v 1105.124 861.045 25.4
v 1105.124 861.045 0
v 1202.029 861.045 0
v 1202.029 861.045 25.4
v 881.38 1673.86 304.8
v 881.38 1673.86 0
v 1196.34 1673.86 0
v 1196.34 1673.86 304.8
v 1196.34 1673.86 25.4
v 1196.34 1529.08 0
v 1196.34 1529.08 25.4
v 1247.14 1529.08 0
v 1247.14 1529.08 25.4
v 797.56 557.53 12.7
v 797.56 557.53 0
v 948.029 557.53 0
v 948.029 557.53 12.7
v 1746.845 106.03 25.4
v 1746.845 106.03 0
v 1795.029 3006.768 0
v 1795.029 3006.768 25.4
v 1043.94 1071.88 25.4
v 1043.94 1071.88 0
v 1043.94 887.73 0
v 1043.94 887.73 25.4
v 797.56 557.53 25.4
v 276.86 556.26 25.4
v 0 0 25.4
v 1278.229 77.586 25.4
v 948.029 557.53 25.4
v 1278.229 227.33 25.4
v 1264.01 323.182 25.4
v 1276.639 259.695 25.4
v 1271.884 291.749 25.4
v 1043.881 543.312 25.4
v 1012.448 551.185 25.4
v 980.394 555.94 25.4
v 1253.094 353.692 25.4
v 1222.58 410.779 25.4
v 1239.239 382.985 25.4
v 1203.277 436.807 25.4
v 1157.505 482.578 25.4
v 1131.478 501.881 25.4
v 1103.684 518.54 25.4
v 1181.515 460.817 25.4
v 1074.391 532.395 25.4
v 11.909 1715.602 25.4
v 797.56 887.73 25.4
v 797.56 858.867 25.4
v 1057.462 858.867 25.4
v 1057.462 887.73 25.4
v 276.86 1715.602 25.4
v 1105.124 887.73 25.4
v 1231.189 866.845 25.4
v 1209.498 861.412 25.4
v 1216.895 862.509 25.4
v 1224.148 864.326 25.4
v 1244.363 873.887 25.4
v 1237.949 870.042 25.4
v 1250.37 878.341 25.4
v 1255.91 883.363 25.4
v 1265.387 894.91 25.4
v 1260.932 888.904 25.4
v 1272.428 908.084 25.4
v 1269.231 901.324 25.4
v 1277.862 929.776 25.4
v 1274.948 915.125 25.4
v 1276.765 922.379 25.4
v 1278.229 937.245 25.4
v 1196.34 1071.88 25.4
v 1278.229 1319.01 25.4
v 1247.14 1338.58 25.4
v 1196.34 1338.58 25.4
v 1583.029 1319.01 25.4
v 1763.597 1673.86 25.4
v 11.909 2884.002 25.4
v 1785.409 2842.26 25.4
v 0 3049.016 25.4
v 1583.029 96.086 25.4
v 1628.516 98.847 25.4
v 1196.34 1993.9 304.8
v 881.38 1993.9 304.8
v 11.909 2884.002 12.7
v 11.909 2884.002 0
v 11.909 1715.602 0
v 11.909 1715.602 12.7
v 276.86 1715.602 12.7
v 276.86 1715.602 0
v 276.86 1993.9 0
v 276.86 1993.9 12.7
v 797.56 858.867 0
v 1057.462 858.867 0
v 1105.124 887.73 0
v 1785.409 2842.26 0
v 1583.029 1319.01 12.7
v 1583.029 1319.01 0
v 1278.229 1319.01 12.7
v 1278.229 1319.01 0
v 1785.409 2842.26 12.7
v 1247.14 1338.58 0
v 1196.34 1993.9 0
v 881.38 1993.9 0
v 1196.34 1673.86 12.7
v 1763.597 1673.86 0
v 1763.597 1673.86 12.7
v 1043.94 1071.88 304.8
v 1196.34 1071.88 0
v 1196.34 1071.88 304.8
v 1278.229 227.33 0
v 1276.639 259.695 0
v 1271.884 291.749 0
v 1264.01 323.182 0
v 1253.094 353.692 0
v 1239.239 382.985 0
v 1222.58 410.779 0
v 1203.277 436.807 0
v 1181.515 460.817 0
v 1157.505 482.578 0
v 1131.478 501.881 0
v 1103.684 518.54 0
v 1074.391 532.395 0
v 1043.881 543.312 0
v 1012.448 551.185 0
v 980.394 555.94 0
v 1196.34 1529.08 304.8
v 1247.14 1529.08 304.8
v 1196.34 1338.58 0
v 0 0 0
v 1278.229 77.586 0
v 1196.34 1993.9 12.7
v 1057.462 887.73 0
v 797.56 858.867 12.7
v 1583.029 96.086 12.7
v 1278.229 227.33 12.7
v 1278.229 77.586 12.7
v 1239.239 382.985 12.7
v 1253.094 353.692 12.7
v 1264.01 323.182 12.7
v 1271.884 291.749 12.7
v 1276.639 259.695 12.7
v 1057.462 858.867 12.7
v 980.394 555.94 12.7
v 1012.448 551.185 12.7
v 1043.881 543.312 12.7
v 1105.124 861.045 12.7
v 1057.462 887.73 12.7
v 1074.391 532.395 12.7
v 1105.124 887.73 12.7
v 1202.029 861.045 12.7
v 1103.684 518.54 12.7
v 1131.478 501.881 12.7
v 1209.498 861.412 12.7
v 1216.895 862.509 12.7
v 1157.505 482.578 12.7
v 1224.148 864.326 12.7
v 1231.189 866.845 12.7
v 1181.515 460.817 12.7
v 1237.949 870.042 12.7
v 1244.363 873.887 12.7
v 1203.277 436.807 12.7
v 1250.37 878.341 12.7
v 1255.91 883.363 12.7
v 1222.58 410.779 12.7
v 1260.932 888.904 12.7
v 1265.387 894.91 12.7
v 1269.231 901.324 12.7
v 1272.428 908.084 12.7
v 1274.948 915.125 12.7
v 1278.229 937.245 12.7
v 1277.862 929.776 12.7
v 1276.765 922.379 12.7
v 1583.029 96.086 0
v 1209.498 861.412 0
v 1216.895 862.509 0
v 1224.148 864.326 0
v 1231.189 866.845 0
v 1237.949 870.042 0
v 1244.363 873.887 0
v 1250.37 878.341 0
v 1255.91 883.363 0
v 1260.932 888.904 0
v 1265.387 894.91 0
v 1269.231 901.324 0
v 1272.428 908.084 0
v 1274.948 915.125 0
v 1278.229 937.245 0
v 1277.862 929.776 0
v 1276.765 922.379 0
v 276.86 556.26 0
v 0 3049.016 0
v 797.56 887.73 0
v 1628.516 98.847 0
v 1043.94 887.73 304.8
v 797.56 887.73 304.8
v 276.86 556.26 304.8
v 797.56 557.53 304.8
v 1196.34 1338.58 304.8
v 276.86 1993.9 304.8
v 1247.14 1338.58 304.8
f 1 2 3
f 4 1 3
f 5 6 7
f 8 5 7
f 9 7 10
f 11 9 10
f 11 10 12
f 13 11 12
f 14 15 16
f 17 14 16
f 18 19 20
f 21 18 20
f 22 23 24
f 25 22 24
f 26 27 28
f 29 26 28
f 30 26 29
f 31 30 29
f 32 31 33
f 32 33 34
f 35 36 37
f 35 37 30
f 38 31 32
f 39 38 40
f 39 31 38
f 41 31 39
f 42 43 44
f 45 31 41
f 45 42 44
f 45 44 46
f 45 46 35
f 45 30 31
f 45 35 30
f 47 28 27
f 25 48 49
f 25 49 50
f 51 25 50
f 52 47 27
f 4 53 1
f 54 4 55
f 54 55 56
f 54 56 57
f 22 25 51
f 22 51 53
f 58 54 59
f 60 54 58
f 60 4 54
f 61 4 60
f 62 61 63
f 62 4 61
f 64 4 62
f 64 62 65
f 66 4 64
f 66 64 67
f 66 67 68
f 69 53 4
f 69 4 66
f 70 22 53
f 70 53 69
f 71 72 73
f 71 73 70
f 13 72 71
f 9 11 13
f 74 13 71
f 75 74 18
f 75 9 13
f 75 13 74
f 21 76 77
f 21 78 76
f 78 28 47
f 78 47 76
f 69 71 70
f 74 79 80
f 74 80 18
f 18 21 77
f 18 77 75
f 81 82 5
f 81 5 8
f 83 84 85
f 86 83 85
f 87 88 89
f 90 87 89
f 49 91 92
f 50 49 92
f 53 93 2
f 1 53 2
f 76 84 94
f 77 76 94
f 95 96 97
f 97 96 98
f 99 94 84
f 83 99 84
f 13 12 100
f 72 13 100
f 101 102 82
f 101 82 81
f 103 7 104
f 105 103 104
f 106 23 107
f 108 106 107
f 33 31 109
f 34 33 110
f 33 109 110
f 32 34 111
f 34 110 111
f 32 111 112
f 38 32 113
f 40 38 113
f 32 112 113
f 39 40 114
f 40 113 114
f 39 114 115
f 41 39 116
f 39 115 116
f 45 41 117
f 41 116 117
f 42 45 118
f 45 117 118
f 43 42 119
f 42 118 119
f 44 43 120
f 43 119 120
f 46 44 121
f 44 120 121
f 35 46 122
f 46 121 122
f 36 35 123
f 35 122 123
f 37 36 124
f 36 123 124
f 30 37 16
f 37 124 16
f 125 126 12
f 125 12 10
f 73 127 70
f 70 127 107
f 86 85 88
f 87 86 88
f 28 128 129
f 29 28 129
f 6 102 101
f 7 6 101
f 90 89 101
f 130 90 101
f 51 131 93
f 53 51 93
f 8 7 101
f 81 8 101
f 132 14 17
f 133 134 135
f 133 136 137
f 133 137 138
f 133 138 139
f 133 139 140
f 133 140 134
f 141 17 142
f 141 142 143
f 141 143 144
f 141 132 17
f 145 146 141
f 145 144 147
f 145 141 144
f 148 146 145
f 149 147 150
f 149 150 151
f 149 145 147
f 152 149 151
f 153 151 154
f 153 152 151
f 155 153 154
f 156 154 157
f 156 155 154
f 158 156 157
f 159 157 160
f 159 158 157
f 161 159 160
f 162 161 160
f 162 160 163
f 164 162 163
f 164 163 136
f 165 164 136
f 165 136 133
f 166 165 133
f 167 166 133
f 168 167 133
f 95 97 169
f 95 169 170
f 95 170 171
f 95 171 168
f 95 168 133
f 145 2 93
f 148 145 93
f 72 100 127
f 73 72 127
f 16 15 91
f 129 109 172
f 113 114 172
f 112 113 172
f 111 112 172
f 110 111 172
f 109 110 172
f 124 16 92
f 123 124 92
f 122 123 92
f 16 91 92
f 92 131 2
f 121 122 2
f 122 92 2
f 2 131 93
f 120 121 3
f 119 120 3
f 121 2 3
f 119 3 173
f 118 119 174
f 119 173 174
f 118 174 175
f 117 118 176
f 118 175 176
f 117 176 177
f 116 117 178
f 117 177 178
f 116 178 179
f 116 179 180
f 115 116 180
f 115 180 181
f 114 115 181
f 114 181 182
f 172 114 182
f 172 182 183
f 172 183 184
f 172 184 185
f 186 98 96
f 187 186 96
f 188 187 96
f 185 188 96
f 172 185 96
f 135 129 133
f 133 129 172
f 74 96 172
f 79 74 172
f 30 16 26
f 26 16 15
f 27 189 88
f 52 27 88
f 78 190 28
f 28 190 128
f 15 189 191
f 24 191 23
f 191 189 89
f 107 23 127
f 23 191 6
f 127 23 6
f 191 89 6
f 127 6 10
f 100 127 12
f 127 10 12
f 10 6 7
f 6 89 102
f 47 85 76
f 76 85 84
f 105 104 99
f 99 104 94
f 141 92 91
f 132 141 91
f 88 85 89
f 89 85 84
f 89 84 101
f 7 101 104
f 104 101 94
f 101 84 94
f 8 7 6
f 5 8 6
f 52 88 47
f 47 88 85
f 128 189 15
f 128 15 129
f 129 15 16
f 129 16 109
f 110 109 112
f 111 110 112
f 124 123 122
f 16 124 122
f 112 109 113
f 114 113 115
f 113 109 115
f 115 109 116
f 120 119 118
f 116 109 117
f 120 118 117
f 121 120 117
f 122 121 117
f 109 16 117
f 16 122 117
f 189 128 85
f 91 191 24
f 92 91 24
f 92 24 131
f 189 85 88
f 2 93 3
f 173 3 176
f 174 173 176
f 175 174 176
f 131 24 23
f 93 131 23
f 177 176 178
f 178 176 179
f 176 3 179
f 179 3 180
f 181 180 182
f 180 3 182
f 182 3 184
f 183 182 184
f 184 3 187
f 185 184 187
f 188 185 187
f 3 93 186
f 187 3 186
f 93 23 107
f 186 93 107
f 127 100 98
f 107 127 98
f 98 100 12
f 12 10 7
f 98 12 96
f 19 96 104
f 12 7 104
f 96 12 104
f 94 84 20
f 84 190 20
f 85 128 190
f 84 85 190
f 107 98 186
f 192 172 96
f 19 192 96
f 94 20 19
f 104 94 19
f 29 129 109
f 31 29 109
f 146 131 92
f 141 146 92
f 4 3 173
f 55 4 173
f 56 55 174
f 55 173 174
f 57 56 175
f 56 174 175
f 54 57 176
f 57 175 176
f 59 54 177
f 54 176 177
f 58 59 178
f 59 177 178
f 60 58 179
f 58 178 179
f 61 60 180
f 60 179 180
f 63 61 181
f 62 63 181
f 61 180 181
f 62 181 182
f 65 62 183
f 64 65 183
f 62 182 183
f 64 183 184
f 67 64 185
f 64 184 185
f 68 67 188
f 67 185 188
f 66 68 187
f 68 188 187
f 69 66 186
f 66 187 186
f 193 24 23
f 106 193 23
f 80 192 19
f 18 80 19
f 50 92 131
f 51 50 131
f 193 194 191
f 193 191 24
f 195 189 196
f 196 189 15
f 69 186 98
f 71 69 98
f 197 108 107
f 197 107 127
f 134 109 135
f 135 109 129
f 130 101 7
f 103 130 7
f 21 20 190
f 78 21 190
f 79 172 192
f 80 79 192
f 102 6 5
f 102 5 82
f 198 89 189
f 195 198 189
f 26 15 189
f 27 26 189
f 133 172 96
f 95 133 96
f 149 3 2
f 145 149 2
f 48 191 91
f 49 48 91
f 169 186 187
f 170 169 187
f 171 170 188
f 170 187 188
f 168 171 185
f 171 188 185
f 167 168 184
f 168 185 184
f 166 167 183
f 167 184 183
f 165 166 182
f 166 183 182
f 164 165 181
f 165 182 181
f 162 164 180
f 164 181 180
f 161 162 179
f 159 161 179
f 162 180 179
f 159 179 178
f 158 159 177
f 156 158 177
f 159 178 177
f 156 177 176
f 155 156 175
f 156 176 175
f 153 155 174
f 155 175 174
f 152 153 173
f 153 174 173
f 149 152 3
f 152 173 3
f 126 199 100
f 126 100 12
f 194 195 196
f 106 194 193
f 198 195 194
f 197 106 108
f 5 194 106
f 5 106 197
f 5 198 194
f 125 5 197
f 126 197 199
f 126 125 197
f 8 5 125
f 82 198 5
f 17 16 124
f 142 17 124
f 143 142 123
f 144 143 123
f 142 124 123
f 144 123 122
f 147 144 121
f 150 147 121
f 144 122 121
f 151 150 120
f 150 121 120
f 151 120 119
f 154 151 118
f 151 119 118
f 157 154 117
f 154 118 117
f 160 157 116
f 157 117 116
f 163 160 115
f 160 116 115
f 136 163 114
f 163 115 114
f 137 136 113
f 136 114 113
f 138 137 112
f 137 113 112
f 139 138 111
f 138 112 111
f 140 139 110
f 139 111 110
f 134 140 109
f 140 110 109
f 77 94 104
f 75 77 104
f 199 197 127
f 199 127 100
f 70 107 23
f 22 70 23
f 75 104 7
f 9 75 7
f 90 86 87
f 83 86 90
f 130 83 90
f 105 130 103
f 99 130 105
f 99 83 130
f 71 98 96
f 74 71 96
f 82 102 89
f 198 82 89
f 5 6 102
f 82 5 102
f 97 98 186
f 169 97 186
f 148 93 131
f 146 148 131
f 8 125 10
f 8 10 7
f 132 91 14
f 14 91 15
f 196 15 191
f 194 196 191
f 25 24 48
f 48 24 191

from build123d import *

# Parameters (mm, degrees)
F1_DEPTH = 12.7
F2_DEPTH = 304.8
F3_DEPTH = 12.7
F4_DEPTH = 25.4
F0_W     = 314.96
F0_H     = 320.04
F5_DEPTH = 304.8


with BuildPart() as f1:
    # F0 (on Top) → F1 (new body)
    with BuildSketch(Plane.XY):
        with BuildLine():
            Line((1278.22876, 227.33), (1278.22876, 77.585675))
            Line((1278.22876, 77.585675), (1583.02876, 96.086365))
            Line((1583.02876, 96.086365), (1583.02876, 1319.010139))
            Line((1583.02876, 1319.010139), (1278.22876, 1319.010139))
            Line((1278.22876, 1319.010139), (1278.22876, 937.244884))
            ThreePointArc((1278.22876, 937.244884), (1255.910296, 883.363347), (1202.02876, 861.044884))
            Line((1202.02876, 861.044884), (1105.124354, 861.044884))
            Line((1105.124354, 861.044884), (1105.124354, 887.73))
            Line((1105.124354, 887.73), (1057.4615, 887.73))
            Line((1057.4615, 887.73), (1057.4615, 858.867228))
            Line((1057.4615, 858.867228), (797.56, 858.867228))
            Line((797.56, 858.867228), (797.56, 557.53))
            Line((797.56, 557.53), (948.02876, 557.53))
            ThreePointArc((948.02876, 557.53), (1181.515419, 460.816659), (1278.22876, 227.33))
        make_face()
    extrude(amount=F1_DEPTH)


with BuildPart() as f2:
    # F0 (on Top) → F2 (new body)
    with BuildSketch(Plane.XY):
        Polygon((276.86, 1715.601564), (276.86, 556.26), (797.56, 557.53), (797.56, 858.867228), (797.56, 887.73), (1043.94, 887.73), (1043.94, 1071.88), (1196.34, 1071.88), (1196.34, 1338.58), (1247.14, 1338.58), (1247.14, 1529.08), (1196.34, 1529.08), (1196.34, 1673.86), (881.38, 1673.86), (881.38, 1993.9), (276.86, 1993.9), align=None)
    extrude(amount=F2_DEPTH)


with BuildPart() as f3:
    # F0 (on Top) → F3 (new body)
    with BuildSketch(Plane.XY):
        Polygon((11.908554, 1715.601564), (276.86, 1715.601564), (276.86, 1993.9), (881.38, 1993.9), (1196.34, 1993.9), (1196.34, 1673.86), (1763.596684, 1673.86), (1785.409082, 2842.26), (11.908554, 2884.001564), align=None)
    extrude(amount=F3_DEPTH)


with BuildPart() as f4:
    # F0 (on Top) → F4 (new body)
    with BuildSketch(Plane.XY):
        with BuildLine():
            Line((0, 3049.016), (0, 556.26))
            Line((0, 556.26), (276.86, 556.26))
            Line((276.86, 556.26), (276.86, 1715.601564))
            Line((276.86, 1715.601564), (11.908554, 1715.601564))
            Line((11.908554, 1715.601564), (11.908554, 2884.001564))
            Line((11.908554, 2884.001564), (1785.409082, 2842.26))
            Line((1785.409082, 2842.26), (1763.596684, 1673.86))
            Line((1763.596684, 1673.86), (1196.34, 1673.86))
            Line((1196.34, 1673.86), (1196.34, 1529.08))
            Line((1196.34, 1529.08), (1247.14, 1529.08))
            Line((1247.14, 1529.08), (1247.14, 1338.58))
            Line((1247.14, 1338.58), (1196.34, 1338.58))
            Line((1196.34, 1338.58), (1196.34, 1071.88))
            Line((1196.34, 1071.88), (1196.34, 887.73))
            Line((1196.34, 887.73), (1105.124354, 887.73))
            Line((1105.124354, 887.73), (1105.124354, 861.044884))
            Line((1105.124354, 861.044884), (1202.02876, 861.044884))
            ThreePointArc((1202.02876, 861.044884), (1255.910296, 883.363347), (1278.22876, 937.244884))
            Line((1278.22876, 937.244884), (1278.22876, 1319.010139))
            Line((1278.22876, 1319.010139), (1583.02876, 1319.010139))
            Line((1583.02876, 1319.010139), (1583.02876, 96.086365))
            Line((1583.02876, 96.086365), (1628.516358, 98.847362))
            Line((1628.516358, 98.847362), (1746.845075, 106.029655))
            Line((1746.845075, 106.029655), (1795.028886, 3006.767739))
            Line((1795.028886, 3006.767739), (0, 3049.016))
        make_face()
        with BuildLine():
            Line((0, 556.26), (0, 0))
            Line((0, 0), (1278.22876, 77.585675))
            Line((1278.22876, 77.585675), (1278.22876, 227.33))
            ThreePointArc((1278.22876, 227.33), (1181.515419, 460.816659), (948.02876, 557.53))
            Line((948.02876, 557.53), (797.56, 557.53))
            Line((797.56, 557.53), (276.86, 556.26))
            Line((276.86, 556.26), (0, 556.26))
        make_face()
        Polygon((1043.94, 1071.88), (1043.94, 887.73), (1057.4615, 887.73), (1105.124354, 887.73), (1196.34, 887.73), (1196.34, 1071.88), align=None)
        Polygon((797.56, 887.73), (797.56, 858.867228), (1057.4615, 858.867228), (1057.4615, 887.73), (1043.94, 887.73), align=None)
    extrude(amount=F4_DEPTH)


with BuildPart() as f5:
    # F0 (on Top) → F5 (new body)
    with BuildSketch(Plane.XY):
        with Locations((1038.86, 1833.88)):
            Rectangle(F0_W, F0_H)
    extrude(amount=F5_DEPTH)


solid = Compound([f1.part, f2.part, f3.part, f4.part, f5.part])
